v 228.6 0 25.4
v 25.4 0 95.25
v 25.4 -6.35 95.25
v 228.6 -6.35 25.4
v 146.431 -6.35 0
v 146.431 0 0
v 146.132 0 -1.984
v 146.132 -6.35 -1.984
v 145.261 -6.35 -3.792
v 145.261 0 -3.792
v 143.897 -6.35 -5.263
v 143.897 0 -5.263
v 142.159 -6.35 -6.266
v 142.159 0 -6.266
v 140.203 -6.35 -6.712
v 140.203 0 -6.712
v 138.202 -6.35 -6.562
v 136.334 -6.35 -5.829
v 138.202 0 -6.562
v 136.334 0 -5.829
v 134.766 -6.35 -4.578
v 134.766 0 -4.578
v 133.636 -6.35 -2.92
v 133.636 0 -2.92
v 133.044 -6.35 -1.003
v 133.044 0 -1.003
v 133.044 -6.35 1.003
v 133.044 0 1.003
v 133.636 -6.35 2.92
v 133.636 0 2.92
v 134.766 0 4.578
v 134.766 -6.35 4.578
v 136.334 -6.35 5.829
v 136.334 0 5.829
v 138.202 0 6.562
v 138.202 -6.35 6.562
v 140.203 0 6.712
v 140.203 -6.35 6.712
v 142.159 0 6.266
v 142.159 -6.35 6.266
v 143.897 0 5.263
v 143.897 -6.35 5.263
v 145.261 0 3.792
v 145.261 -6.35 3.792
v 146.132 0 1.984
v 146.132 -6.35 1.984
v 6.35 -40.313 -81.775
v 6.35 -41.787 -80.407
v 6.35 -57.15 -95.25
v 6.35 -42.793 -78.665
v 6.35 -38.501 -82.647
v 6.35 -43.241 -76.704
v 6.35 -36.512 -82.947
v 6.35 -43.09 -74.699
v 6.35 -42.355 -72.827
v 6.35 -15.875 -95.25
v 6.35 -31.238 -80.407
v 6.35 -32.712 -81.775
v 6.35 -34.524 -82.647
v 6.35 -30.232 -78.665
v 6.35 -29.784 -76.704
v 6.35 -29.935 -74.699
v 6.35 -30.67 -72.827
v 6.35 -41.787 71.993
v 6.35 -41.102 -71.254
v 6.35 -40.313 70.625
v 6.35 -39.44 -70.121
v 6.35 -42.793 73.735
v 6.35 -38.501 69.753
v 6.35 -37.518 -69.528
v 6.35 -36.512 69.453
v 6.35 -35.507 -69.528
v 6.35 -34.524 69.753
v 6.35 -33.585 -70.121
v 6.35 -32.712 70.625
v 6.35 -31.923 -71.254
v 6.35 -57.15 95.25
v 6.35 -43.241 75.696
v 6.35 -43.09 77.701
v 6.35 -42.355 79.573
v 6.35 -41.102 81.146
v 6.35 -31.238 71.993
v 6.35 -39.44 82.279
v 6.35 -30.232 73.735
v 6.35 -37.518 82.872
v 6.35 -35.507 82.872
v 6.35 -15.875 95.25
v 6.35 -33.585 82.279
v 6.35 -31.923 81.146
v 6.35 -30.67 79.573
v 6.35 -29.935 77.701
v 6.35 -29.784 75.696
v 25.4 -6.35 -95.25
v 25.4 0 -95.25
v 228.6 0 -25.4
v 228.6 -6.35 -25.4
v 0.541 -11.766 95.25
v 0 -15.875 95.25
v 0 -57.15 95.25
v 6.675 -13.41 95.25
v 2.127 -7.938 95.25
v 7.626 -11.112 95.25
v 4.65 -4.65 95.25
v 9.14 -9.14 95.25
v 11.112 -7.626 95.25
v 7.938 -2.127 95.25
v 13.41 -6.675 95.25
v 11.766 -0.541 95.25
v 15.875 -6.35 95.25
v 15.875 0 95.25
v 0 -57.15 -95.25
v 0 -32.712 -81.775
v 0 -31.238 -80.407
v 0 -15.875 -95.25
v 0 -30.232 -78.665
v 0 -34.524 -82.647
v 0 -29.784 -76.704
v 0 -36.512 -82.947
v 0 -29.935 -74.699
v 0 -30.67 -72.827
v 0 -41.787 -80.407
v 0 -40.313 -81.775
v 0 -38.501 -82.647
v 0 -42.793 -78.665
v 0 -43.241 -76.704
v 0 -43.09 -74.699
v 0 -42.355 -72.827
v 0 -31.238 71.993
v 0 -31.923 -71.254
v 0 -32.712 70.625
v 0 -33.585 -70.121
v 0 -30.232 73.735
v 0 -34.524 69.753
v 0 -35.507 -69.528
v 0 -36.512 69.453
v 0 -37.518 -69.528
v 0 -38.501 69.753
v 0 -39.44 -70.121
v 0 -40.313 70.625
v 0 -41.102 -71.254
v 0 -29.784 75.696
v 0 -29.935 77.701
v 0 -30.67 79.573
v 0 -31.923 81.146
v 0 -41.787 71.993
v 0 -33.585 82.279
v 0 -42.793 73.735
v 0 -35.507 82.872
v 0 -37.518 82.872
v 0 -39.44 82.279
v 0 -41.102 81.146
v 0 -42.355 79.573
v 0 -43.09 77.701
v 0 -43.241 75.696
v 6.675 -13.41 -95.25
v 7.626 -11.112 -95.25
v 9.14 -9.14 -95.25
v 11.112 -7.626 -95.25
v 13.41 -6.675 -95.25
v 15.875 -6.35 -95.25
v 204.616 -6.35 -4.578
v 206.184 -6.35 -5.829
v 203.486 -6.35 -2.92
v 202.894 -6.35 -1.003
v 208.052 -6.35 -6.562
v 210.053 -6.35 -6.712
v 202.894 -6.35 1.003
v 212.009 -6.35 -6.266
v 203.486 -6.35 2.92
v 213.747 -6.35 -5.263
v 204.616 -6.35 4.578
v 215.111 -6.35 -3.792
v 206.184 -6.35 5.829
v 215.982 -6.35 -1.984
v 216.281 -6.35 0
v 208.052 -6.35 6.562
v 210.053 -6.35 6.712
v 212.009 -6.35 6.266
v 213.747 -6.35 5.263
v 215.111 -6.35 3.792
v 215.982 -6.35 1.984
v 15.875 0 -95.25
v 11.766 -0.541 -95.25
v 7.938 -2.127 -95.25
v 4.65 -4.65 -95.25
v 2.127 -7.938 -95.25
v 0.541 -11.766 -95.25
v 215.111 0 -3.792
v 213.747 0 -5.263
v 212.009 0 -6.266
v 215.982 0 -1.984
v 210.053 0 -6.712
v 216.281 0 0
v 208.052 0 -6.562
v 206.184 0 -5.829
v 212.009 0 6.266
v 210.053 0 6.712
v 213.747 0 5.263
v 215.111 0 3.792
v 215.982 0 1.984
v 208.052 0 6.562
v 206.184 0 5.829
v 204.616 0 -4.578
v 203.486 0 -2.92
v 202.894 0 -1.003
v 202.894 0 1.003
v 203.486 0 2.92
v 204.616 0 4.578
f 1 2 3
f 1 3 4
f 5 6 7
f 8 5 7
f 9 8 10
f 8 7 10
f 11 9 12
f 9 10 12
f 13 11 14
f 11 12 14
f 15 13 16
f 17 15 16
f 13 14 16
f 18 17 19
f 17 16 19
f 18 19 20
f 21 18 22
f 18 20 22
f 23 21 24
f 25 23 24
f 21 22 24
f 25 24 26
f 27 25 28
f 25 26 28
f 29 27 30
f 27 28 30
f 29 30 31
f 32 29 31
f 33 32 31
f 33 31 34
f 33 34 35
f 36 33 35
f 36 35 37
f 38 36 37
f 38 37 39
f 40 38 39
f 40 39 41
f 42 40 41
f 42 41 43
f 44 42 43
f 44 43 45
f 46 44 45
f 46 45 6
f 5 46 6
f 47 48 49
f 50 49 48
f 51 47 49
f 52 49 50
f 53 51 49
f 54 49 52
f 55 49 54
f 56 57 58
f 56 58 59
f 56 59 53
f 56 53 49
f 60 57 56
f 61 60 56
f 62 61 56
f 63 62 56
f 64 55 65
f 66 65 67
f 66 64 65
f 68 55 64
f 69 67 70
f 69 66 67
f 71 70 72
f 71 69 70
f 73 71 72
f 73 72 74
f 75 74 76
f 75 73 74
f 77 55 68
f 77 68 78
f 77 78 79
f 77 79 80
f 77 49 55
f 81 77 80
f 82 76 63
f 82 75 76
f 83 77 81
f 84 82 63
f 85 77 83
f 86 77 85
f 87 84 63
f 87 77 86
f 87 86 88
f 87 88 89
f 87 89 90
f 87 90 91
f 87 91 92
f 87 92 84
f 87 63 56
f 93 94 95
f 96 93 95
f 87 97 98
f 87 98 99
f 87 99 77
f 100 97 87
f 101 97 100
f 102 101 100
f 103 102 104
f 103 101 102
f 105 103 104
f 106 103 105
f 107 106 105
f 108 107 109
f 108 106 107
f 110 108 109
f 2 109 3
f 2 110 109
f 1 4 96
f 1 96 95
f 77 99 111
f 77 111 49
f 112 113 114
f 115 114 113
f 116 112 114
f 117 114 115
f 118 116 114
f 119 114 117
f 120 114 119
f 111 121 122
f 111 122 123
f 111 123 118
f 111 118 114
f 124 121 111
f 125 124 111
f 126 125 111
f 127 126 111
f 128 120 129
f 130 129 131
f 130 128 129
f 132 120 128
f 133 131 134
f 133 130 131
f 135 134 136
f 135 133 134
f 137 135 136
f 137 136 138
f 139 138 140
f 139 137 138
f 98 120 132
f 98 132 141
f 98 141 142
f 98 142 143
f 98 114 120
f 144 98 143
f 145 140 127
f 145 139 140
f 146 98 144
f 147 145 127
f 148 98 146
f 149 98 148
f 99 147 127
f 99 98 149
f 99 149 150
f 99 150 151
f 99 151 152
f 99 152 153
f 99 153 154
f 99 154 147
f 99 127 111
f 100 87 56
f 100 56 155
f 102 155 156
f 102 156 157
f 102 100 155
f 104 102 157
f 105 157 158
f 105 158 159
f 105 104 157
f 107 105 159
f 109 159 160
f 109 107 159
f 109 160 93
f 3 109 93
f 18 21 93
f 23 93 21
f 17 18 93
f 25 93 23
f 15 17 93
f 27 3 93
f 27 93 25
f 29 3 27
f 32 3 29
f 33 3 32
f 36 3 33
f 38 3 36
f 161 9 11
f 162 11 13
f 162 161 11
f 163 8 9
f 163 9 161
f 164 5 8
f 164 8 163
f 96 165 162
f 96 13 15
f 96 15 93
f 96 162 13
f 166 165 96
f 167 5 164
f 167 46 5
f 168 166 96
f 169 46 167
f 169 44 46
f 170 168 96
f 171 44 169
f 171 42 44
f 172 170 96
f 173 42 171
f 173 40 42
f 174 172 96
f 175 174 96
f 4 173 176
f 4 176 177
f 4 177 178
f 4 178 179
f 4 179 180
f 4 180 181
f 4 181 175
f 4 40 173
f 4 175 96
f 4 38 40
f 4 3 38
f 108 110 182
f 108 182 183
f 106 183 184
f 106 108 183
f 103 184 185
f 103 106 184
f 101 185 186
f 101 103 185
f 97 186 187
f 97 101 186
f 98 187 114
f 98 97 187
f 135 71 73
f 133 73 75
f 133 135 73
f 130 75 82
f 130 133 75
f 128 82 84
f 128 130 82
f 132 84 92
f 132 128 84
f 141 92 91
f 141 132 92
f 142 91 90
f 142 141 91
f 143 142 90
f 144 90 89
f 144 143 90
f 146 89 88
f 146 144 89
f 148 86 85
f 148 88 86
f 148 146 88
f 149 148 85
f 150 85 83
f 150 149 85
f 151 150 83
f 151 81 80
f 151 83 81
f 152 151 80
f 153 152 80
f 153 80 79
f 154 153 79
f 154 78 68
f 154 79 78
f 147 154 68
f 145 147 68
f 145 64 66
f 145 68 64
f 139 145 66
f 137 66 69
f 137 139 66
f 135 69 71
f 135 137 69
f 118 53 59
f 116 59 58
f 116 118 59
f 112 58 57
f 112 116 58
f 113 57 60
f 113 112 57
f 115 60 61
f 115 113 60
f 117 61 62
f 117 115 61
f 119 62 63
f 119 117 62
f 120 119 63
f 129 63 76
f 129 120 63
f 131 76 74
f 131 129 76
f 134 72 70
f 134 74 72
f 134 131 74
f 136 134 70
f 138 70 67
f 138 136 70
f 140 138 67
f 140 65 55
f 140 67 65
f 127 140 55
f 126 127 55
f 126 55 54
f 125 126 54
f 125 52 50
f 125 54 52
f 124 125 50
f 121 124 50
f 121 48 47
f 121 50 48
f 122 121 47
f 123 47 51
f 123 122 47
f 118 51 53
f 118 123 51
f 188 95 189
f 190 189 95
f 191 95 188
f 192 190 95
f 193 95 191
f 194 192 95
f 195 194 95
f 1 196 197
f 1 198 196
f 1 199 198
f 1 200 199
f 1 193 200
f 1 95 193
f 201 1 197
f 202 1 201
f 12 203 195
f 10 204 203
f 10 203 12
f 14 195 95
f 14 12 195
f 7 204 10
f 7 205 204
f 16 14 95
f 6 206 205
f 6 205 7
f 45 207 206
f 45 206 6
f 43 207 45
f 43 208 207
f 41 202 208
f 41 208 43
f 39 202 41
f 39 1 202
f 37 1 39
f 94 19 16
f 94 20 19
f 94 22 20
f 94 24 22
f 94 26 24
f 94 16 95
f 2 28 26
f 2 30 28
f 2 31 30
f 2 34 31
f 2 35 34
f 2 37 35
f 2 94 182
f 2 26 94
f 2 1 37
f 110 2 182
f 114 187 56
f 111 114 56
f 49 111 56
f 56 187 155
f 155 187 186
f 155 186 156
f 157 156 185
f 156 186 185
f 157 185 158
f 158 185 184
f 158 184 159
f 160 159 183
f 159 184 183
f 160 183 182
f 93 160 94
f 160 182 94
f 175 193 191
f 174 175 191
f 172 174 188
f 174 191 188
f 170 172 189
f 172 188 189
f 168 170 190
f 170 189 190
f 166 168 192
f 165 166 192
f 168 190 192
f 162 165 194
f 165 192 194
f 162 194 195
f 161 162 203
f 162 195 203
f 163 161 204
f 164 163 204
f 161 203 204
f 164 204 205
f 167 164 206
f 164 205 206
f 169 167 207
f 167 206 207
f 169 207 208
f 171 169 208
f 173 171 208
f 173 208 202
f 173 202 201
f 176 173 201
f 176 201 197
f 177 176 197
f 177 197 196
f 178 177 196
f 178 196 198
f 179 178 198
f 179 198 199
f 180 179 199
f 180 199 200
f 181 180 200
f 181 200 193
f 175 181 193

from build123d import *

# Parameters (mm, degrees)
EXTRUDE1_DEPTH         = 95.25
SKETCH2_R              = 6.731
CUT_CHAMFER_DEPTH      = 508
CUT_CHAMFER_DEPTH_BACK = 58.15
SKETCH3_R              = 6.746875
CUT_HOLES_DEPTH        = 229.6


with BuildPart() as part:
    # Sketch1 → Extrude1 (new body, symmetric)
    with BuildSketch(Plane.XY):
        with BuildLine():
            Line((228.6, 0), (15.875, 0))
            ThreePointArc((15.875, 0), (4.649679849, -4.649679849), (0, -15.875))
            Line((0, -15.875), (0, -57.15))
            Line((0, -57.15), (6.35, -57.15))
            Line((6.35, -57.15), (6.35, -15.875))
            ThreePointArc((6.35, -15.875), (9.139807909, -9.139807909), (15.875, -6.35))
            Line((15.875, -6.35), (228.6, -6.35))
            Line((228.6, -6.35), (228.6, 0))
        make_face()
    extrude(amount=EXTRUDE1_DEPTH, both=True)

    # Sketch2 → Cut-Chamfer (cut, two sides)
    with BuildSketch(Plane(origin=(0, 0, 0), x_dir=(1, 0, 0), z_dir=(0, 1, 0))) as cut_chamfer_sk:
        with Locations((209.55, 0)):
            Circle(SKETCH2_R)
        with Locations((139.7, 0)):
            Circle(SKETCH2_R)
        Polygon((25.4, 95.25), (228.6, 25.4), (228.6, 95.25), align=None)
        Polygon((25.4, -95.25), (228.6, -25.4), (228.6, -95.25), align=None)
    extrude(amount=CUT_CHAMFER_DEPTH, mode=Mode.SUBTRACT)
    extrude(cut_chamfer_sk.sketch, amount=-CUT_CHAMFER_DEPTH_BACK, mode=Mode.SUBTRACT)

    # Sketch3 → Cut-Holes (cut, through all)
    with BuildSketch(Plane(origin=(0, 0, 0), x_dir=(0, 0, -1), z_dir=(1, 0, 0))):
        with Locations((-76.2, -36.5125)):
            Circle(SKETCH3_R)
        with Locations((76.2, -36.5125)):
            Circle(SKETCH3_R)
    extrude(amount=CUT_HOLES_DEPTH, mode=Mode.SUBTRACT)


solid = part.part
